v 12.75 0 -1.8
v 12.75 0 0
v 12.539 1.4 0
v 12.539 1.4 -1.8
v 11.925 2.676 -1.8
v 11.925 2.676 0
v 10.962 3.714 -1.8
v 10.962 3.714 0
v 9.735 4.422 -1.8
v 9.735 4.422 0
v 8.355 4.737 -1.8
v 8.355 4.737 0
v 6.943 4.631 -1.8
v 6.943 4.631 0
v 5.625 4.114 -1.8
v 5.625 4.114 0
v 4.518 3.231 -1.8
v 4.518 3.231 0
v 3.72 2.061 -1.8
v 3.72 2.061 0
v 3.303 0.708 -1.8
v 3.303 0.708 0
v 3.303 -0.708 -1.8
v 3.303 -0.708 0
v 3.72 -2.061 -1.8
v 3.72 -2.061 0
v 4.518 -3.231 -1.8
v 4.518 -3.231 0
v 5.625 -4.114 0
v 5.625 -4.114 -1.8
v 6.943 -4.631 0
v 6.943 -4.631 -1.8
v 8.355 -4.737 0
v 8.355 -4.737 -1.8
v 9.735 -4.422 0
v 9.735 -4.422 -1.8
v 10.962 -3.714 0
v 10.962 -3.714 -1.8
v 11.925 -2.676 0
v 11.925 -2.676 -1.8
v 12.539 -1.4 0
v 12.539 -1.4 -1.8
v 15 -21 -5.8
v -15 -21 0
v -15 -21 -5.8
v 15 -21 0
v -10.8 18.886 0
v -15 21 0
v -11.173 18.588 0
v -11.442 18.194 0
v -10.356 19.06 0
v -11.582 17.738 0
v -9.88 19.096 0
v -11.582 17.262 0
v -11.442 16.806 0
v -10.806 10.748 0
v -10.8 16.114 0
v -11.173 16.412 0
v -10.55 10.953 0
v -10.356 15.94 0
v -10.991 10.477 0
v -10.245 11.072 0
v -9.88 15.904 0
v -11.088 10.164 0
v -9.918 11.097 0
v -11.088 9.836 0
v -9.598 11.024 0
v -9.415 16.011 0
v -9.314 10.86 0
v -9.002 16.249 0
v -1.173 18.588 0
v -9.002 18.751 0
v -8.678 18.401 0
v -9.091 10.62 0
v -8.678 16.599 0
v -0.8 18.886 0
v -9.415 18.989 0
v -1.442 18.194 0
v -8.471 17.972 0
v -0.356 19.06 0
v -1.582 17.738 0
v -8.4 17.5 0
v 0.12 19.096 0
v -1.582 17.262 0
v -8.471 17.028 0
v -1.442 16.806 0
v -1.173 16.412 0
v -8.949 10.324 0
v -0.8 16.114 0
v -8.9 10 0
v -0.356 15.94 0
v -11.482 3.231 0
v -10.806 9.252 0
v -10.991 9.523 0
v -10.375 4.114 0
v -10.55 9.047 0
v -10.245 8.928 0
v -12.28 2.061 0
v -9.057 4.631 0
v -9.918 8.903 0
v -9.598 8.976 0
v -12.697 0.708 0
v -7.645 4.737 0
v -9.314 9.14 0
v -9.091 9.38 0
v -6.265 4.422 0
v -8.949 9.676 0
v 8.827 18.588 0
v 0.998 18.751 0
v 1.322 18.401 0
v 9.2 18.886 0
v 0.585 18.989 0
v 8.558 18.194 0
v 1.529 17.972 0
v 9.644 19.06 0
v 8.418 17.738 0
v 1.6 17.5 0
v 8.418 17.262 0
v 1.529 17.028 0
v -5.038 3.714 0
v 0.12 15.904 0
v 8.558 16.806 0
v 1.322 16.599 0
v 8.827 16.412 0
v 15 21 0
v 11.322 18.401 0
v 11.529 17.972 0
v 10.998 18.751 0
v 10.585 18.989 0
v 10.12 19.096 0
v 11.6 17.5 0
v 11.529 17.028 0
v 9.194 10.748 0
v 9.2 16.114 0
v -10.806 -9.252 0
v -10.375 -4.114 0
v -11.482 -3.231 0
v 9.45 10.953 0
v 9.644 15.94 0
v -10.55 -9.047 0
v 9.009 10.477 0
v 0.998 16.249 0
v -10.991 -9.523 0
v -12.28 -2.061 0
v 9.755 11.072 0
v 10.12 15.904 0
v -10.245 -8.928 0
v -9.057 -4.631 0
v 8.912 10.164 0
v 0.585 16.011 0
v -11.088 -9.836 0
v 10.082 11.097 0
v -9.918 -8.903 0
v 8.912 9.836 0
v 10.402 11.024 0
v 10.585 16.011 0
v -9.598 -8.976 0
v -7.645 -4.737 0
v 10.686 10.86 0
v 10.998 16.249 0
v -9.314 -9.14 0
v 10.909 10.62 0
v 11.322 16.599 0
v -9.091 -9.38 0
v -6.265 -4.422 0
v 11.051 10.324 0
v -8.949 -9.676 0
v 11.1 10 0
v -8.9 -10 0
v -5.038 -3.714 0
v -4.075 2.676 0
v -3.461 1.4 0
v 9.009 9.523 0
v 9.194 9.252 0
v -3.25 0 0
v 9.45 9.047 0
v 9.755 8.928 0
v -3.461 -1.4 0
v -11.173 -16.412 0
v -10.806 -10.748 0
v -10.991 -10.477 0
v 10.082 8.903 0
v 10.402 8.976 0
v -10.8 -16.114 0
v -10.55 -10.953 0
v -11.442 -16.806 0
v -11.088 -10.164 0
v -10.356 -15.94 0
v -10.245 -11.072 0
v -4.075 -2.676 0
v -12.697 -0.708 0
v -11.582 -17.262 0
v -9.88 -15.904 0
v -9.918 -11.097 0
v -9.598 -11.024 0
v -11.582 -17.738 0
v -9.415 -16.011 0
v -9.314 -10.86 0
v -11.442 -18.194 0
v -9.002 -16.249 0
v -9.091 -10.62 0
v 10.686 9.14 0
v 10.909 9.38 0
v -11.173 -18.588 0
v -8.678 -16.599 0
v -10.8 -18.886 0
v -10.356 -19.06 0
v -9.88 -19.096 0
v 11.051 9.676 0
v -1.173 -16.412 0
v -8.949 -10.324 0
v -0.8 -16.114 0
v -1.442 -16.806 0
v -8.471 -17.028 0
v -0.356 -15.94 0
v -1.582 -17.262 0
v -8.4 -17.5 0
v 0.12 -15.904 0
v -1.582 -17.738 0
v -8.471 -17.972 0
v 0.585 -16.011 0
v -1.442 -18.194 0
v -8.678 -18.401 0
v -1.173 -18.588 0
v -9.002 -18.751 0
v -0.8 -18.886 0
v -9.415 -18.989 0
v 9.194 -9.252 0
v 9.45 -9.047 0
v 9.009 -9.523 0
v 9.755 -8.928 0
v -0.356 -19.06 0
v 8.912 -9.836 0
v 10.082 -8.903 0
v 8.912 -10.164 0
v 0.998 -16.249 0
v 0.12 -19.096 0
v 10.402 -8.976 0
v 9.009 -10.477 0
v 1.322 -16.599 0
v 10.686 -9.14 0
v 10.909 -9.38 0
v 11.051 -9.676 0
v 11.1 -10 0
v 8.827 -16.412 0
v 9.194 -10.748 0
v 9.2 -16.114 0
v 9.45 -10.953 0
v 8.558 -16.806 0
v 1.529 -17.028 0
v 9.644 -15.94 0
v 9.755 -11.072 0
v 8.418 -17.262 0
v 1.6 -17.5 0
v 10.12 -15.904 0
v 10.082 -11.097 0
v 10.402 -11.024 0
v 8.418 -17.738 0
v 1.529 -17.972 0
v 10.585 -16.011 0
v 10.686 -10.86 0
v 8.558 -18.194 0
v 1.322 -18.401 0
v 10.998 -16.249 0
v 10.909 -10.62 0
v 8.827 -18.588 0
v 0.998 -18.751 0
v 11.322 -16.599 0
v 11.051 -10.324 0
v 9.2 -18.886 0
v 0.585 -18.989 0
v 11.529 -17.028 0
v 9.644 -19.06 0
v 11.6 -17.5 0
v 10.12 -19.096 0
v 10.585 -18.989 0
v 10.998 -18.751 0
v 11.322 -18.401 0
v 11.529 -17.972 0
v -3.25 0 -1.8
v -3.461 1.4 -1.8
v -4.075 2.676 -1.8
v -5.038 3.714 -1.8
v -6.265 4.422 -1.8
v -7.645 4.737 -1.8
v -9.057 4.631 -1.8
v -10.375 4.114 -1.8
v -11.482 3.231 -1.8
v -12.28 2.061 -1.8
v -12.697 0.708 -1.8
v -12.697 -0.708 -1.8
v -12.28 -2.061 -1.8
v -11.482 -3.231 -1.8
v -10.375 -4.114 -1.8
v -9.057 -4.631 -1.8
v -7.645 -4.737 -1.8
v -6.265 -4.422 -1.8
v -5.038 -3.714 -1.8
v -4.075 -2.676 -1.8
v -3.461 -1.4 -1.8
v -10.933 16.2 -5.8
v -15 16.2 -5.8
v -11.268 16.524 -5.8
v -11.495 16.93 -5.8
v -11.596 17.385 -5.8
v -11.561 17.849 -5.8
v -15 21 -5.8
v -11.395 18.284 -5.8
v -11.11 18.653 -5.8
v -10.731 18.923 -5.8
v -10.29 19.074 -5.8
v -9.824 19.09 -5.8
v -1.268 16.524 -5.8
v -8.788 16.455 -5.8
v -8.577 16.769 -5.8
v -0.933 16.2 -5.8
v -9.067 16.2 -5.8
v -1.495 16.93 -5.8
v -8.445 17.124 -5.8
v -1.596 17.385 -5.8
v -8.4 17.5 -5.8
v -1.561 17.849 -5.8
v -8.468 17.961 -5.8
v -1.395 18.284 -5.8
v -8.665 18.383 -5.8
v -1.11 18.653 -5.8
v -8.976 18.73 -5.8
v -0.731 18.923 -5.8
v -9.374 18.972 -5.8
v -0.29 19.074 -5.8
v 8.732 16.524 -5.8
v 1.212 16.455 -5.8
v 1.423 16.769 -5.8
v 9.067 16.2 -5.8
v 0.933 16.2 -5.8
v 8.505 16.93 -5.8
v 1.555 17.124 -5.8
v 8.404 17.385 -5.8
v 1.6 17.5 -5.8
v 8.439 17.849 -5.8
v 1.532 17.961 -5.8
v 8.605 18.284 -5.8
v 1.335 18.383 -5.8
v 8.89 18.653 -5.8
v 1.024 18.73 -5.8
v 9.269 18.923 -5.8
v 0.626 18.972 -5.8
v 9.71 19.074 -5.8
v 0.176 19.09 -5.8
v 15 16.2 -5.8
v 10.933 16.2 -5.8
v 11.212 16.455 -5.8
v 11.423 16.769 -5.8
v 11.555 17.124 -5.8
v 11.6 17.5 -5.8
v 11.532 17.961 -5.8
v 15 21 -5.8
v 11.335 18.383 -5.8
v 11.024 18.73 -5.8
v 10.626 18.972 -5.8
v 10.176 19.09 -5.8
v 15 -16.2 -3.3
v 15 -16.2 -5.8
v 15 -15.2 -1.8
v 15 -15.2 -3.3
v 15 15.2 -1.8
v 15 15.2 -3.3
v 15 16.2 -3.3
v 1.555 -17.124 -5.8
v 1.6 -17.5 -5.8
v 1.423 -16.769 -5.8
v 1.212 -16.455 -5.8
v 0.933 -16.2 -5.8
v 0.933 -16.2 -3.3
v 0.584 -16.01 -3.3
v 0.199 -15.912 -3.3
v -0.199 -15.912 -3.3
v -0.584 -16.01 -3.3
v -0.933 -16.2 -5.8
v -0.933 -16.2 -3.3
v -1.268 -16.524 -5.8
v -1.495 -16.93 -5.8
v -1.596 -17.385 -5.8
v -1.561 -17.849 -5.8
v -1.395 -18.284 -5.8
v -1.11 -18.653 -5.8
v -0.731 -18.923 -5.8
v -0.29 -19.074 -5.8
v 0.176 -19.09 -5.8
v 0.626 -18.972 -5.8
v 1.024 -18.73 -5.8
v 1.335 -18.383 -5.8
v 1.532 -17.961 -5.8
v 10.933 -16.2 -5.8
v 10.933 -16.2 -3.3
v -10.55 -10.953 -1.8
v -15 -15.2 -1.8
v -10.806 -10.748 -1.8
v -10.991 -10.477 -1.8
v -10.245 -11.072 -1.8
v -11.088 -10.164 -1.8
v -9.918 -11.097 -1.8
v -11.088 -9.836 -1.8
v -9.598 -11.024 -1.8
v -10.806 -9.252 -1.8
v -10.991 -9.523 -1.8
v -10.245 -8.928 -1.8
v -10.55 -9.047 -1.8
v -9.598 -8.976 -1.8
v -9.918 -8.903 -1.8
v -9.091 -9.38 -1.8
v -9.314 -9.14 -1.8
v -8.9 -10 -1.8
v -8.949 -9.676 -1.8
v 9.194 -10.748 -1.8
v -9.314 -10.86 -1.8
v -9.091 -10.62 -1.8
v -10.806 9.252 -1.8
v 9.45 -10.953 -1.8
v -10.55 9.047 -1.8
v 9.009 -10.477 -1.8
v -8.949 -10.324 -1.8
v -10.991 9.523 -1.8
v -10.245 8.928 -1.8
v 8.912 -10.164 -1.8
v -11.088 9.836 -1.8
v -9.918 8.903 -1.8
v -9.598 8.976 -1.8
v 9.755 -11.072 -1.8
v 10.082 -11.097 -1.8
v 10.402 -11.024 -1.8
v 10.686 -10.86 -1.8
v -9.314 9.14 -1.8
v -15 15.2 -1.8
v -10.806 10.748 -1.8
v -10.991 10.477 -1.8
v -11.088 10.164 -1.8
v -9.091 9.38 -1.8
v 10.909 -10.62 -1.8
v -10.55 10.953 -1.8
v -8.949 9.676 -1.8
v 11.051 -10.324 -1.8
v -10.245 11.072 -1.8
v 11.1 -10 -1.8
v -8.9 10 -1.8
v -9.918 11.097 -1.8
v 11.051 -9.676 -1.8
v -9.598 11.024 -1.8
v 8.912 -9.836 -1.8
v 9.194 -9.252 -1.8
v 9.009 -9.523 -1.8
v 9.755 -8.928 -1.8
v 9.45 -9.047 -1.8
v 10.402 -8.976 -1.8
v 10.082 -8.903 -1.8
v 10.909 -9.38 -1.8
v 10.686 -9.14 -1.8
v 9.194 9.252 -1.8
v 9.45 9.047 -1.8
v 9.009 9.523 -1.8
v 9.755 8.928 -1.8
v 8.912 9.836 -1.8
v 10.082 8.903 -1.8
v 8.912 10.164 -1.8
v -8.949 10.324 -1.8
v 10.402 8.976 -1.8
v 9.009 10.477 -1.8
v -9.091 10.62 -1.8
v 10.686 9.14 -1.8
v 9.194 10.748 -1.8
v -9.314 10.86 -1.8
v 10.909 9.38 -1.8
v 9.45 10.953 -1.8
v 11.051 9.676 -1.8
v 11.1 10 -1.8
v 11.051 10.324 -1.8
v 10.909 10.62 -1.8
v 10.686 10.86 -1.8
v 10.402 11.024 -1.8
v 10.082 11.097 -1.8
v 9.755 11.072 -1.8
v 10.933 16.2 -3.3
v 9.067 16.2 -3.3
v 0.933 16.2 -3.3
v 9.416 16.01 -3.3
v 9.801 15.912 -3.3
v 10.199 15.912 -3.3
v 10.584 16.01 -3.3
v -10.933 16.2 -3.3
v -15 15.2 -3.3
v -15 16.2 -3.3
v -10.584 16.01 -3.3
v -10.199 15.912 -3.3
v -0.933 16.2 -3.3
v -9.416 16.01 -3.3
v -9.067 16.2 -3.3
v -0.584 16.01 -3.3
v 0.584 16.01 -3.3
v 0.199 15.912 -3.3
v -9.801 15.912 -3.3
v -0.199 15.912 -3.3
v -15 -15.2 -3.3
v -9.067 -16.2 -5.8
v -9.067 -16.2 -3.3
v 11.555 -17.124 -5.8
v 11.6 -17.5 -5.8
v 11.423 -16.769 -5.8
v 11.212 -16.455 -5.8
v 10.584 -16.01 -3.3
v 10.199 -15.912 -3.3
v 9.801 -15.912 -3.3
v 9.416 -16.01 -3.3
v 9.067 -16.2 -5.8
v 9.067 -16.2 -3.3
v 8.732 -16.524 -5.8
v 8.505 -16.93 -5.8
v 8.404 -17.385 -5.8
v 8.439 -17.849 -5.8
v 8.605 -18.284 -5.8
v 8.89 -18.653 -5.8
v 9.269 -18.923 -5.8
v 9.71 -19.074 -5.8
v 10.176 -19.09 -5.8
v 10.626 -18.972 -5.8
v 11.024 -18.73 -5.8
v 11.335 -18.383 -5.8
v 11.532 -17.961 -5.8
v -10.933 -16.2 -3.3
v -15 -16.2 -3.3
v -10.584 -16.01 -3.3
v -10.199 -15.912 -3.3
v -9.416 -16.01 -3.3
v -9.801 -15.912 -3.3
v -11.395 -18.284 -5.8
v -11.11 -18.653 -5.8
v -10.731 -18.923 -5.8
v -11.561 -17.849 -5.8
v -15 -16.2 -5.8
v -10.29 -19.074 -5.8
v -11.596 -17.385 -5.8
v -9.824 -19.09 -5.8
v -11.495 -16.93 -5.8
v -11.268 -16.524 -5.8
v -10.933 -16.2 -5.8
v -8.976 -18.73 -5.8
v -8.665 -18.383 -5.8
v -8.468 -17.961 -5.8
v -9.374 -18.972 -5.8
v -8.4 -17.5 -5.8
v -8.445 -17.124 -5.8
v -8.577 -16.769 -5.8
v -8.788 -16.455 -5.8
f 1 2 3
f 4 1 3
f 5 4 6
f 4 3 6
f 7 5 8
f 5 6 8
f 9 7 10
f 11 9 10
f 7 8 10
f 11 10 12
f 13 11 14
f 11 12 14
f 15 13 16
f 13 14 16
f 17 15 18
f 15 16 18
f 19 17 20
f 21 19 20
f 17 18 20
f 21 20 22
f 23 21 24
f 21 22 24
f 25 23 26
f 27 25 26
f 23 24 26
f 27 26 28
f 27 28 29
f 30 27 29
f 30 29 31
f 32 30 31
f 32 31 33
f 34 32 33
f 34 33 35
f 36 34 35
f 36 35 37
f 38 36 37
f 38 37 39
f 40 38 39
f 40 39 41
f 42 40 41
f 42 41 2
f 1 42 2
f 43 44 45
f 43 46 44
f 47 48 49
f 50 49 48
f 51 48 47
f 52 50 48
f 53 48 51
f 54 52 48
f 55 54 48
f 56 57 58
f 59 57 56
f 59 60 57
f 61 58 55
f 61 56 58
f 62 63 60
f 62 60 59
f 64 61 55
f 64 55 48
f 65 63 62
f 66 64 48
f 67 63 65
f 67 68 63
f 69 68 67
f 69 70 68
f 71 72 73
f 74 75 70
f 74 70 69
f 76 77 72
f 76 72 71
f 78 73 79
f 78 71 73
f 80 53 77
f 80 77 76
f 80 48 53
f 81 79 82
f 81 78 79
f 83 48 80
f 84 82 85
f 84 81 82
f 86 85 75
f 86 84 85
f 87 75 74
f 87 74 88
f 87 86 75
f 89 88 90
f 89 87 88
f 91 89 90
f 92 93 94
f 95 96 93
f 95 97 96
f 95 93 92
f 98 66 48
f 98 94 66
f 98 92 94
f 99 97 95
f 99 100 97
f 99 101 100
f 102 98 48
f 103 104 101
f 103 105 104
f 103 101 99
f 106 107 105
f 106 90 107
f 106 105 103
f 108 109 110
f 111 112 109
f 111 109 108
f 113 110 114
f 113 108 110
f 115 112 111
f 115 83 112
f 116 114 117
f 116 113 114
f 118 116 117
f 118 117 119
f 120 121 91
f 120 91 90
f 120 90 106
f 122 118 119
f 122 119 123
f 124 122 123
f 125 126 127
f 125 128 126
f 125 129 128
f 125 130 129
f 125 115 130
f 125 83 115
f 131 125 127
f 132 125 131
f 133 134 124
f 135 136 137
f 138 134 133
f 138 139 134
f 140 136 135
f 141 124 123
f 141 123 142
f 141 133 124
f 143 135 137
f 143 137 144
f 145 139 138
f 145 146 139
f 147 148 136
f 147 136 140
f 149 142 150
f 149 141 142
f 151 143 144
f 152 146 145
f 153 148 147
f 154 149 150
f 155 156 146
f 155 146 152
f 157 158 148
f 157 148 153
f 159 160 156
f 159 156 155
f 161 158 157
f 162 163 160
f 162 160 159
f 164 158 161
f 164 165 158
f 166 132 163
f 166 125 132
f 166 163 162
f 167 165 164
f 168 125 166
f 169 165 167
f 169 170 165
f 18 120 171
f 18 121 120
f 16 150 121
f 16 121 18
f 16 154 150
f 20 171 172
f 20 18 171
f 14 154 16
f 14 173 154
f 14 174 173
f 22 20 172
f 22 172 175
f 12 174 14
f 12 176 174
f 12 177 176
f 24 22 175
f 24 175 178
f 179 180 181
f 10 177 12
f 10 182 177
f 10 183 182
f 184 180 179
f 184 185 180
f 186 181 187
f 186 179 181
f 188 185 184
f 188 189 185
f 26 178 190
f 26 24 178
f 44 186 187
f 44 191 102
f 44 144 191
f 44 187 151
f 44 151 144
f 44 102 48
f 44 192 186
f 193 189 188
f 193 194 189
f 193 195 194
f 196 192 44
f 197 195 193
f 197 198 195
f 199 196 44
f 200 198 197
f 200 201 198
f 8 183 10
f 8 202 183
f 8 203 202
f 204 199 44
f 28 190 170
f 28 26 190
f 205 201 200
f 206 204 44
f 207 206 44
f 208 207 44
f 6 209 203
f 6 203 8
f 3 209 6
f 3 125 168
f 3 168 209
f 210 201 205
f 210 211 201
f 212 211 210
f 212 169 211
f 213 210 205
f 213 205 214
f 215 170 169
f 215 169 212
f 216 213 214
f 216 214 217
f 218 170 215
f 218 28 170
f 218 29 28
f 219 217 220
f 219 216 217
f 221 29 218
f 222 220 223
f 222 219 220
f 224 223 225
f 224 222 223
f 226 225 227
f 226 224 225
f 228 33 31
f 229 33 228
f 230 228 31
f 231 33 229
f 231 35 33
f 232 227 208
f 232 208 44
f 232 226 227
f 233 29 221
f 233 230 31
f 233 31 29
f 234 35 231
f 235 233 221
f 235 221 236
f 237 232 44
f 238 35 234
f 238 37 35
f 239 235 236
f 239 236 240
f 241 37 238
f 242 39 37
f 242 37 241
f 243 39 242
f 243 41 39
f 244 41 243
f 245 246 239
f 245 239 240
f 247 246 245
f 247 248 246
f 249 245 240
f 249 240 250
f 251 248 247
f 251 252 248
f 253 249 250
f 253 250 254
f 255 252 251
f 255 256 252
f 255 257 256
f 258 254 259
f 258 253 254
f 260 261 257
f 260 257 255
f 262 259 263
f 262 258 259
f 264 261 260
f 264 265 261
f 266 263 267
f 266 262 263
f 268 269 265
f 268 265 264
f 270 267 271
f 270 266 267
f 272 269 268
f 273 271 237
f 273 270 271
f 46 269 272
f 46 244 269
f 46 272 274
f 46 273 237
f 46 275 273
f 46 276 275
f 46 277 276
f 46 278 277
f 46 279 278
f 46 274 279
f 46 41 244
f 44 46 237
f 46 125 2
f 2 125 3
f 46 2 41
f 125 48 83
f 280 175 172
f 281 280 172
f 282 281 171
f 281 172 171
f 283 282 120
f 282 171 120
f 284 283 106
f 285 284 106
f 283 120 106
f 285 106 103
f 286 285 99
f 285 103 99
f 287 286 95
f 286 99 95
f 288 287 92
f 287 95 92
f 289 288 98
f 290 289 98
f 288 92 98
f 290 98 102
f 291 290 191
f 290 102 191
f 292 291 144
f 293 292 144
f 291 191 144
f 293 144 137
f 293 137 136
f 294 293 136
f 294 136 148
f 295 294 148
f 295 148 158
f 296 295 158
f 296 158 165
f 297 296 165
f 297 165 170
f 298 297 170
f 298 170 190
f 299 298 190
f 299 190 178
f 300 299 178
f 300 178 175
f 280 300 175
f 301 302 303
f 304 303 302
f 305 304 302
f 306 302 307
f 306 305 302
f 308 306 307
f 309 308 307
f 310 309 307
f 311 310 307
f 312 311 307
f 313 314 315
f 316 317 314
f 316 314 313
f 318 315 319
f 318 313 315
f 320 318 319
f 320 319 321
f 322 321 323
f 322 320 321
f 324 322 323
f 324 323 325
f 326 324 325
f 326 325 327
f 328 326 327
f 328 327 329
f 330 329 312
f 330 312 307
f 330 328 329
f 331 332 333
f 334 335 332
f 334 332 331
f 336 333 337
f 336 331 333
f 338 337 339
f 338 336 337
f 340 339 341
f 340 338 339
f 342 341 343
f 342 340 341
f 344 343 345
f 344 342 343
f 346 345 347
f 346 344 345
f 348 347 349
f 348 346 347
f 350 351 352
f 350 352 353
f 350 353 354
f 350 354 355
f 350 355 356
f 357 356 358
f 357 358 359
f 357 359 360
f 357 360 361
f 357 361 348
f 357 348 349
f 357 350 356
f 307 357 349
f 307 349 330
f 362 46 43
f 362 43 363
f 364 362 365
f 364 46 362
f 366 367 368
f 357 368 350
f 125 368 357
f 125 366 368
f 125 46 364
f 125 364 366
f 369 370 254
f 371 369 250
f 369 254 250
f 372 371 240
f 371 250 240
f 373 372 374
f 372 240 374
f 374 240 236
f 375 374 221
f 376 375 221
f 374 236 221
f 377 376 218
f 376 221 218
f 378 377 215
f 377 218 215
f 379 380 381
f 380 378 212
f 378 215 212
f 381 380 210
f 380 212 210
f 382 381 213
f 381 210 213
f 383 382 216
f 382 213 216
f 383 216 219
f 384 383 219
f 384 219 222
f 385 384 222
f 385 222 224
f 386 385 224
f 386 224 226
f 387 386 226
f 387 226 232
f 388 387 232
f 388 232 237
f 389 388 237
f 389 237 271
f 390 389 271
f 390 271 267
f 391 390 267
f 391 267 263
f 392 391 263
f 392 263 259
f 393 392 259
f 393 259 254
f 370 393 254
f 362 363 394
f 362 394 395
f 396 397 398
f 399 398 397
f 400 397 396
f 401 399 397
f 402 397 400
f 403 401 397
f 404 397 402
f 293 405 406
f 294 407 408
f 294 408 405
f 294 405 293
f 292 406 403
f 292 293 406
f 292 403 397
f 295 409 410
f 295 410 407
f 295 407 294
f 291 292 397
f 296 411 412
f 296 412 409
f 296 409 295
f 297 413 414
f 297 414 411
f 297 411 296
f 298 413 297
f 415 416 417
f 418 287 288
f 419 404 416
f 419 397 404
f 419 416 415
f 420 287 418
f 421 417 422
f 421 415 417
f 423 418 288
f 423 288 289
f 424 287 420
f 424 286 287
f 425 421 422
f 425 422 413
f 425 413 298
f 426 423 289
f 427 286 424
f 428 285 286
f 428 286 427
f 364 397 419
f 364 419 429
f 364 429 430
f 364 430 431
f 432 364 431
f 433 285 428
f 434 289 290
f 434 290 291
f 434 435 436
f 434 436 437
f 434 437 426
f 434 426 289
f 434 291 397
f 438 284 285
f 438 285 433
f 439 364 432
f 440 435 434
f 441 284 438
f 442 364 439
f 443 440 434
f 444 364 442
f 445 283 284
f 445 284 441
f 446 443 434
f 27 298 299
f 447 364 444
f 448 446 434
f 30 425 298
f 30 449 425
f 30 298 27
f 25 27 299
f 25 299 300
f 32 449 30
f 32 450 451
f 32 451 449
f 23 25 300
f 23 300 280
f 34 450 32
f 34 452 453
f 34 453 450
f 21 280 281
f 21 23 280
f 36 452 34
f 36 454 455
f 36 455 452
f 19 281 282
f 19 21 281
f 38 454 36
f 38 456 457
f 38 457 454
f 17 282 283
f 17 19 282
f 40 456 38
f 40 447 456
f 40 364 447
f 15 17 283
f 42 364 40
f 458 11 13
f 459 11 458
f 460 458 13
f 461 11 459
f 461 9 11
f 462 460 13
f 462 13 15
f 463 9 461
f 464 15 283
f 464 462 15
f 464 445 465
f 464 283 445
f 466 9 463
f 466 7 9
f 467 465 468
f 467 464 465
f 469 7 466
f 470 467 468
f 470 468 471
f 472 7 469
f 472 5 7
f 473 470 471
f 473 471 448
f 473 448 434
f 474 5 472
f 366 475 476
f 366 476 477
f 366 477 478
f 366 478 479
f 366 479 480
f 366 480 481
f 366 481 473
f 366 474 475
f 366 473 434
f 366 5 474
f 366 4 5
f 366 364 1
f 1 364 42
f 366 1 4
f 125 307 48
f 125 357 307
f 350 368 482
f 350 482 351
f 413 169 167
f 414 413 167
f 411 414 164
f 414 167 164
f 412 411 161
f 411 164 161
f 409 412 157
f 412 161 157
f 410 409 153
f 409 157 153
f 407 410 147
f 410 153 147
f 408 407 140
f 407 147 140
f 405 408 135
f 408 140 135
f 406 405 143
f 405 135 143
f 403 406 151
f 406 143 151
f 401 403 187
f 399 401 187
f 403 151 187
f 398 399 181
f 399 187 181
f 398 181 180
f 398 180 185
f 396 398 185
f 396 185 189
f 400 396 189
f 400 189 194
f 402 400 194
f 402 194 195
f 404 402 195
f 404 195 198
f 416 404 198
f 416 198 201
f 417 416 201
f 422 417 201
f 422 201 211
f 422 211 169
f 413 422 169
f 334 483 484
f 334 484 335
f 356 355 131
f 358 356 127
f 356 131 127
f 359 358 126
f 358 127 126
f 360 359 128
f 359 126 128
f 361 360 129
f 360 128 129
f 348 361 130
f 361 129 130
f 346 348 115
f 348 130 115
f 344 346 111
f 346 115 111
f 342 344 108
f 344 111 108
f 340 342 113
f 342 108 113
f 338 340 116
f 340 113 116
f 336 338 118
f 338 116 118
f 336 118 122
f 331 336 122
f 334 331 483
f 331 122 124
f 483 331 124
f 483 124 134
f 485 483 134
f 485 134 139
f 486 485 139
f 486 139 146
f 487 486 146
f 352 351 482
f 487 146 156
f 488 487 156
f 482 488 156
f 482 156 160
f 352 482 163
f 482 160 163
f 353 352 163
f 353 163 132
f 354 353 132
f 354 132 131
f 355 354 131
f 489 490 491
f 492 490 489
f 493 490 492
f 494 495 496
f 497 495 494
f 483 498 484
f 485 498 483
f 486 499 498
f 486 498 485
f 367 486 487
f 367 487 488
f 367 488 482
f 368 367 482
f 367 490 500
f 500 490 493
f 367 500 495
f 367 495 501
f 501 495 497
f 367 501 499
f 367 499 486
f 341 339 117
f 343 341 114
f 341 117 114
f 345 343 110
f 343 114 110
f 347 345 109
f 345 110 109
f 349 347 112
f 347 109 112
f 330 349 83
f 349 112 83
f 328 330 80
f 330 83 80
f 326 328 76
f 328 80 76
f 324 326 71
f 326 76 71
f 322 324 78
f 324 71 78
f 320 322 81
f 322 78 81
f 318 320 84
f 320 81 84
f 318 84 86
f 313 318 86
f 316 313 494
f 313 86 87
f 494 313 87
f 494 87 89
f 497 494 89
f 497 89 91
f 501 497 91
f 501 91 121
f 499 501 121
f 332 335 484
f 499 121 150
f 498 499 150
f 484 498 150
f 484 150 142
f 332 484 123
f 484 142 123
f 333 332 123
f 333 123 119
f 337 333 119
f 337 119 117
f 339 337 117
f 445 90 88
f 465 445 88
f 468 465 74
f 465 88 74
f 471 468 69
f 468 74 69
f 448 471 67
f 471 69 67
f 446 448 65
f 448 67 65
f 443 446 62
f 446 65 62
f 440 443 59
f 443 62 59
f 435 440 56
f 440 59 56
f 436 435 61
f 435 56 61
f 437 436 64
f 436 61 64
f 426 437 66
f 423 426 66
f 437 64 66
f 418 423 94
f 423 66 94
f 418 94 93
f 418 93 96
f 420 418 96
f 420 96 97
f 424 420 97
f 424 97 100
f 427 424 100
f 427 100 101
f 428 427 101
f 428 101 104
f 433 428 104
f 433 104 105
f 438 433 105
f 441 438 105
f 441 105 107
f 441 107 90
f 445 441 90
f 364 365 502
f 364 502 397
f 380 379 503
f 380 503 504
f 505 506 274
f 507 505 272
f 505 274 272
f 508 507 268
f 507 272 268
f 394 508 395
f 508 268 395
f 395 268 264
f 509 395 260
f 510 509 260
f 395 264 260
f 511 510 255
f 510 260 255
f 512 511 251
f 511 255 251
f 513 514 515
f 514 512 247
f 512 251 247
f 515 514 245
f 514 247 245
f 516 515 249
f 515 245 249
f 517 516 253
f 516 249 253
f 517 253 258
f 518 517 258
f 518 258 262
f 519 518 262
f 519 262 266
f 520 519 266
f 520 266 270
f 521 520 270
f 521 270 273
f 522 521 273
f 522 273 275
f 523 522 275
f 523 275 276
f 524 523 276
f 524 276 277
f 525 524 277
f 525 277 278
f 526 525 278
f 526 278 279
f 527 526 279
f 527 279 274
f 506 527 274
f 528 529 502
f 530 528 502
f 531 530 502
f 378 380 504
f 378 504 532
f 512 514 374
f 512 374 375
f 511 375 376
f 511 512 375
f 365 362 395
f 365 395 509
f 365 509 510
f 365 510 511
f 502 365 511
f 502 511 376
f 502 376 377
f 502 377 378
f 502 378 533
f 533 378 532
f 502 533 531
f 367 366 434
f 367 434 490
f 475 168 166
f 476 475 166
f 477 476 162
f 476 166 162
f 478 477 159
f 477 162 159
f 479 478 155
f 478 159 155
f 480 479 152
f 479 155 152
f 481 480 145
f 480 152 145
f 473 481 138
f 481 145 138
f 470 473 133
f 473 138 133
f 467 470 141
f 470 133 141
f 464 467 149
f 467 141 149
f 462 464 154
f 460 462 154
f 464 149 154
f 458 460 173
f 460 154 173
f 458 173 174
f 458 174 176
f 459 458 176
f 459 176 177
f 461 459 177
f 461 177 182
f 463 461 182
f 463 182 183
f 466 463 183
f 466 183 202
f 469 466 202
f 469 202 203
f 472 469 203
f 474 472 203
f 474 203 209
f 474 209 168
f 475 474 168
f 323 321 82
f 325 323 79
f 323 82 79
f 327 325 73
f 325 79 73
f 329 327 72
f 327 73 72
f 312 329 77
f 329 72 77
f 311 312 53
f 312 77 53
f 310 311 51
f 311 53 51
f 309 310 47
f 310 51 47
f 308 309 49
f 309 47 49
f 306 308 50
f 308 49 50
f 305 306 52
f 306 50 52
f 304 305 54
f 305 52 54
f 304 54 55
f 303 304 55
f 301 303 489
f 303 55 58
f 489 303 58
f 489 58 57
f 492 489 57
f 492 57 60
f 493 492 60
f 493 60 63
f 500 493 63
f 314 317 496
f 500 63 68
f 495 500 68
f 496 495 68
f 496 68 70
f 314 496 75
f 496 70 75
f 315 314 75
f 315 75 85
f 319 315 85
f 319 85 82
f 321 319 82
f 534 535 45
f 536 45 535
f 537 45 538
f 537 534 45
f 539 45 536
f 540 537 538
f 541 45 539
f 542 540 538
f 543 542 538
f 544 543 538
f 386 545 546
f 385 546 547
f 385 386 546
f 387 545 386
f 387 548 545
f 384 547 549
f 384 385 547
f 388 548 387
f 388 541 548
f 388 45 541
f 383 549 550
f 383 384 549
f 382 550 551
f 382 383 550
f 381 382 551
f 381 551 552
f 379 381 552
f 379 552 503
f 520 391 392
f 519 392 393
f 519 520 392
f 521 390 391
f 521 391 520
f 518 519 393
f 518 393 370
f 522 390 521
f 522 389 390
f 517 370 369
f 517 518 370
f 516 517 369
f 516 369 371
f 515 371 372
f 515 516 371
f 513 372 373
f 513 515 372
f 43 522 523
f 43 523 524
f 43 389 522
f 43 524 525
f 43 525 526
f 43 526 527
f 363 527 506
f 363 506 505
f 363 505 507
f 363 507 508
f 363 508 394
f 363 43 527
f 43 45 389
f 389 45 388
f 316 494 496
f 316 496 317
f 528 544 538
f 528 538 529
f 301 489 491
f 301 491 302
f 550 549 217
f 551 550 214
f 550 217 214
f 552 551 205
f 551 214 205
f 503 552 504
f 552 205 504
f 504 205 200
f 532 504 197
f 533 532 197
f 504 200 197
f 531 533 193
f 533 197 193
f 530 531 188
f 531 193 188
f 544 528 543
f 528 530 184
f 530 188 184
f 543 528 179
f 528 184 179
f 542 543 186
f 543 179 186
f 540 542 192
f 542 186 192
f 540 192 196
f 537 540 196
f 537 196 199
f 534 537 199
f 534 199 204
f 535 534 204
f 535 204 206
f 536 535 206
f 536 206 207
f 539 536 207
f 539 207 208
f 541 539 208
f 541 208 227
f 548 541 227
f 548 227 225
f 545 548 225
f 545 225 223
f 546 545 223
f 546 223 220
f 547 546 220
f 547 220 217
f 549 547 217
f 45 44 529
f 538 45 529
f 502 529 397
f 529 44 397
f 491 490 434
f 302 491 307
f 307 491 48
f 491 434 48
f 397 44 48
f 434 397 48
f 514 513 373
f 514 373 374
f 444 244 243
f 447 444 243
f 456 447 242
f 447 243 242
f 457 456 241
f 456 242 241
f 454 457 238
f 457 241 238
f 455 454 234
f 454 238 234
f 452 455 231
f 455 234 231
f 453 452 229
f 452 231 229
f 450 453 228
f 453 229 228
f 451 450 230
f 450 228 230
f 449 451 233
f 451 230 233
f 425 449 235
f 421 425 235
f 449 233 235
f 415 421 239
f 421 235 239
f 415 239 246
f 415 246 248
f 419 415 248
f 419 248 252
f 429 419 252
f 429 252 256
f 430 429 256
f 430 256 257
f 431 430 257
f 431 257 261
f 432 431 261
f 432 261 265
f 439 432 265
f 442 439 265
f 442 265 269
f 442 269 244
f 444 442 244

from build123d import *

# Parameters (mm, degrees)
PAD_DEPTH       = 15
PAD_DEPTH_BACK  = 15
SKETCH001_R     = 1.6
HOLE_DEPTH      = 25
SKETCH002_R     = 1.1
POCKET_DEPTH    = 5.801
SKETCH003_R     = 4.75
POCKET001_DEPTH = 5


with BuildPart() as part:
    # Sketch → Pad (new body, two sides)
    with BuildSketch(Plane.YZ) as pad_sk:
        Polygon((-21, 0), (-21, -5.8), (-16.2, -5.8), (-16.2, -3.3), (-15.2, -3.3), (-15.2, -1.8), (15.2, -1.8), (15.2, -3.3), (16.2, -3.3), (16.2, -5.8), (21, -5.8), (21, 0), align=None)
    extrude(amount=PAD_DEPTH)
    extrude(pad_sk.sketch, amount=-PAD_DEPTH_BACK)

    # Sketch001 → Hole (cut)
    with BuildSketch(Plane.XY):
        with Locations((-10, 17.5)):
            Circle(SKETCH001_R)
        with Locations((0, 17.5)):
            Circle(SKETCH001_R)
        with Locations((10, 17.5)):
            Circle(SKETCH001_R)
        with Locations((10, -17.5)):
            Circle(SKETCH001_R)
        with Locations((0, -17.5)):
            Circle(SKETCH001_R)
        with Locations((-10, -17.5)):
            Circle(SKETCH001_R)
    extrude(amount=-HOLE_DEPTH, mode=Mode.SUBTRACT)

    # Sketch002 → Pocket (cut, through all)
    with BuildSketch(Plane.XY):
        with Locations((-10, 10)):
            Circle(SKETCH002_R)
        with Locations((10, 10)):
            Circle(SKETCH002_R)
        with Locations((10, -10)):
            Circle(SKETCH002_R)
        with Locations((-10, -10)):
            Circle(SKETCH002_R)
    extrude(amount=-POCKET_DEPTH, mode=Mode.SUBTRACT)

    # Sketch003 → Pocket001 (cut)
    with BuildSketch(Plane.XY):
        with Locations((-8, 0)):
            Circle(SKETCH003_R)
        with Locations((8, 0)):
            Circle(SKETCH003_R)
    extrude(amount=-POCKET001_DEPTH, mode=Mode.SUBTRACT)


solid = part.part
